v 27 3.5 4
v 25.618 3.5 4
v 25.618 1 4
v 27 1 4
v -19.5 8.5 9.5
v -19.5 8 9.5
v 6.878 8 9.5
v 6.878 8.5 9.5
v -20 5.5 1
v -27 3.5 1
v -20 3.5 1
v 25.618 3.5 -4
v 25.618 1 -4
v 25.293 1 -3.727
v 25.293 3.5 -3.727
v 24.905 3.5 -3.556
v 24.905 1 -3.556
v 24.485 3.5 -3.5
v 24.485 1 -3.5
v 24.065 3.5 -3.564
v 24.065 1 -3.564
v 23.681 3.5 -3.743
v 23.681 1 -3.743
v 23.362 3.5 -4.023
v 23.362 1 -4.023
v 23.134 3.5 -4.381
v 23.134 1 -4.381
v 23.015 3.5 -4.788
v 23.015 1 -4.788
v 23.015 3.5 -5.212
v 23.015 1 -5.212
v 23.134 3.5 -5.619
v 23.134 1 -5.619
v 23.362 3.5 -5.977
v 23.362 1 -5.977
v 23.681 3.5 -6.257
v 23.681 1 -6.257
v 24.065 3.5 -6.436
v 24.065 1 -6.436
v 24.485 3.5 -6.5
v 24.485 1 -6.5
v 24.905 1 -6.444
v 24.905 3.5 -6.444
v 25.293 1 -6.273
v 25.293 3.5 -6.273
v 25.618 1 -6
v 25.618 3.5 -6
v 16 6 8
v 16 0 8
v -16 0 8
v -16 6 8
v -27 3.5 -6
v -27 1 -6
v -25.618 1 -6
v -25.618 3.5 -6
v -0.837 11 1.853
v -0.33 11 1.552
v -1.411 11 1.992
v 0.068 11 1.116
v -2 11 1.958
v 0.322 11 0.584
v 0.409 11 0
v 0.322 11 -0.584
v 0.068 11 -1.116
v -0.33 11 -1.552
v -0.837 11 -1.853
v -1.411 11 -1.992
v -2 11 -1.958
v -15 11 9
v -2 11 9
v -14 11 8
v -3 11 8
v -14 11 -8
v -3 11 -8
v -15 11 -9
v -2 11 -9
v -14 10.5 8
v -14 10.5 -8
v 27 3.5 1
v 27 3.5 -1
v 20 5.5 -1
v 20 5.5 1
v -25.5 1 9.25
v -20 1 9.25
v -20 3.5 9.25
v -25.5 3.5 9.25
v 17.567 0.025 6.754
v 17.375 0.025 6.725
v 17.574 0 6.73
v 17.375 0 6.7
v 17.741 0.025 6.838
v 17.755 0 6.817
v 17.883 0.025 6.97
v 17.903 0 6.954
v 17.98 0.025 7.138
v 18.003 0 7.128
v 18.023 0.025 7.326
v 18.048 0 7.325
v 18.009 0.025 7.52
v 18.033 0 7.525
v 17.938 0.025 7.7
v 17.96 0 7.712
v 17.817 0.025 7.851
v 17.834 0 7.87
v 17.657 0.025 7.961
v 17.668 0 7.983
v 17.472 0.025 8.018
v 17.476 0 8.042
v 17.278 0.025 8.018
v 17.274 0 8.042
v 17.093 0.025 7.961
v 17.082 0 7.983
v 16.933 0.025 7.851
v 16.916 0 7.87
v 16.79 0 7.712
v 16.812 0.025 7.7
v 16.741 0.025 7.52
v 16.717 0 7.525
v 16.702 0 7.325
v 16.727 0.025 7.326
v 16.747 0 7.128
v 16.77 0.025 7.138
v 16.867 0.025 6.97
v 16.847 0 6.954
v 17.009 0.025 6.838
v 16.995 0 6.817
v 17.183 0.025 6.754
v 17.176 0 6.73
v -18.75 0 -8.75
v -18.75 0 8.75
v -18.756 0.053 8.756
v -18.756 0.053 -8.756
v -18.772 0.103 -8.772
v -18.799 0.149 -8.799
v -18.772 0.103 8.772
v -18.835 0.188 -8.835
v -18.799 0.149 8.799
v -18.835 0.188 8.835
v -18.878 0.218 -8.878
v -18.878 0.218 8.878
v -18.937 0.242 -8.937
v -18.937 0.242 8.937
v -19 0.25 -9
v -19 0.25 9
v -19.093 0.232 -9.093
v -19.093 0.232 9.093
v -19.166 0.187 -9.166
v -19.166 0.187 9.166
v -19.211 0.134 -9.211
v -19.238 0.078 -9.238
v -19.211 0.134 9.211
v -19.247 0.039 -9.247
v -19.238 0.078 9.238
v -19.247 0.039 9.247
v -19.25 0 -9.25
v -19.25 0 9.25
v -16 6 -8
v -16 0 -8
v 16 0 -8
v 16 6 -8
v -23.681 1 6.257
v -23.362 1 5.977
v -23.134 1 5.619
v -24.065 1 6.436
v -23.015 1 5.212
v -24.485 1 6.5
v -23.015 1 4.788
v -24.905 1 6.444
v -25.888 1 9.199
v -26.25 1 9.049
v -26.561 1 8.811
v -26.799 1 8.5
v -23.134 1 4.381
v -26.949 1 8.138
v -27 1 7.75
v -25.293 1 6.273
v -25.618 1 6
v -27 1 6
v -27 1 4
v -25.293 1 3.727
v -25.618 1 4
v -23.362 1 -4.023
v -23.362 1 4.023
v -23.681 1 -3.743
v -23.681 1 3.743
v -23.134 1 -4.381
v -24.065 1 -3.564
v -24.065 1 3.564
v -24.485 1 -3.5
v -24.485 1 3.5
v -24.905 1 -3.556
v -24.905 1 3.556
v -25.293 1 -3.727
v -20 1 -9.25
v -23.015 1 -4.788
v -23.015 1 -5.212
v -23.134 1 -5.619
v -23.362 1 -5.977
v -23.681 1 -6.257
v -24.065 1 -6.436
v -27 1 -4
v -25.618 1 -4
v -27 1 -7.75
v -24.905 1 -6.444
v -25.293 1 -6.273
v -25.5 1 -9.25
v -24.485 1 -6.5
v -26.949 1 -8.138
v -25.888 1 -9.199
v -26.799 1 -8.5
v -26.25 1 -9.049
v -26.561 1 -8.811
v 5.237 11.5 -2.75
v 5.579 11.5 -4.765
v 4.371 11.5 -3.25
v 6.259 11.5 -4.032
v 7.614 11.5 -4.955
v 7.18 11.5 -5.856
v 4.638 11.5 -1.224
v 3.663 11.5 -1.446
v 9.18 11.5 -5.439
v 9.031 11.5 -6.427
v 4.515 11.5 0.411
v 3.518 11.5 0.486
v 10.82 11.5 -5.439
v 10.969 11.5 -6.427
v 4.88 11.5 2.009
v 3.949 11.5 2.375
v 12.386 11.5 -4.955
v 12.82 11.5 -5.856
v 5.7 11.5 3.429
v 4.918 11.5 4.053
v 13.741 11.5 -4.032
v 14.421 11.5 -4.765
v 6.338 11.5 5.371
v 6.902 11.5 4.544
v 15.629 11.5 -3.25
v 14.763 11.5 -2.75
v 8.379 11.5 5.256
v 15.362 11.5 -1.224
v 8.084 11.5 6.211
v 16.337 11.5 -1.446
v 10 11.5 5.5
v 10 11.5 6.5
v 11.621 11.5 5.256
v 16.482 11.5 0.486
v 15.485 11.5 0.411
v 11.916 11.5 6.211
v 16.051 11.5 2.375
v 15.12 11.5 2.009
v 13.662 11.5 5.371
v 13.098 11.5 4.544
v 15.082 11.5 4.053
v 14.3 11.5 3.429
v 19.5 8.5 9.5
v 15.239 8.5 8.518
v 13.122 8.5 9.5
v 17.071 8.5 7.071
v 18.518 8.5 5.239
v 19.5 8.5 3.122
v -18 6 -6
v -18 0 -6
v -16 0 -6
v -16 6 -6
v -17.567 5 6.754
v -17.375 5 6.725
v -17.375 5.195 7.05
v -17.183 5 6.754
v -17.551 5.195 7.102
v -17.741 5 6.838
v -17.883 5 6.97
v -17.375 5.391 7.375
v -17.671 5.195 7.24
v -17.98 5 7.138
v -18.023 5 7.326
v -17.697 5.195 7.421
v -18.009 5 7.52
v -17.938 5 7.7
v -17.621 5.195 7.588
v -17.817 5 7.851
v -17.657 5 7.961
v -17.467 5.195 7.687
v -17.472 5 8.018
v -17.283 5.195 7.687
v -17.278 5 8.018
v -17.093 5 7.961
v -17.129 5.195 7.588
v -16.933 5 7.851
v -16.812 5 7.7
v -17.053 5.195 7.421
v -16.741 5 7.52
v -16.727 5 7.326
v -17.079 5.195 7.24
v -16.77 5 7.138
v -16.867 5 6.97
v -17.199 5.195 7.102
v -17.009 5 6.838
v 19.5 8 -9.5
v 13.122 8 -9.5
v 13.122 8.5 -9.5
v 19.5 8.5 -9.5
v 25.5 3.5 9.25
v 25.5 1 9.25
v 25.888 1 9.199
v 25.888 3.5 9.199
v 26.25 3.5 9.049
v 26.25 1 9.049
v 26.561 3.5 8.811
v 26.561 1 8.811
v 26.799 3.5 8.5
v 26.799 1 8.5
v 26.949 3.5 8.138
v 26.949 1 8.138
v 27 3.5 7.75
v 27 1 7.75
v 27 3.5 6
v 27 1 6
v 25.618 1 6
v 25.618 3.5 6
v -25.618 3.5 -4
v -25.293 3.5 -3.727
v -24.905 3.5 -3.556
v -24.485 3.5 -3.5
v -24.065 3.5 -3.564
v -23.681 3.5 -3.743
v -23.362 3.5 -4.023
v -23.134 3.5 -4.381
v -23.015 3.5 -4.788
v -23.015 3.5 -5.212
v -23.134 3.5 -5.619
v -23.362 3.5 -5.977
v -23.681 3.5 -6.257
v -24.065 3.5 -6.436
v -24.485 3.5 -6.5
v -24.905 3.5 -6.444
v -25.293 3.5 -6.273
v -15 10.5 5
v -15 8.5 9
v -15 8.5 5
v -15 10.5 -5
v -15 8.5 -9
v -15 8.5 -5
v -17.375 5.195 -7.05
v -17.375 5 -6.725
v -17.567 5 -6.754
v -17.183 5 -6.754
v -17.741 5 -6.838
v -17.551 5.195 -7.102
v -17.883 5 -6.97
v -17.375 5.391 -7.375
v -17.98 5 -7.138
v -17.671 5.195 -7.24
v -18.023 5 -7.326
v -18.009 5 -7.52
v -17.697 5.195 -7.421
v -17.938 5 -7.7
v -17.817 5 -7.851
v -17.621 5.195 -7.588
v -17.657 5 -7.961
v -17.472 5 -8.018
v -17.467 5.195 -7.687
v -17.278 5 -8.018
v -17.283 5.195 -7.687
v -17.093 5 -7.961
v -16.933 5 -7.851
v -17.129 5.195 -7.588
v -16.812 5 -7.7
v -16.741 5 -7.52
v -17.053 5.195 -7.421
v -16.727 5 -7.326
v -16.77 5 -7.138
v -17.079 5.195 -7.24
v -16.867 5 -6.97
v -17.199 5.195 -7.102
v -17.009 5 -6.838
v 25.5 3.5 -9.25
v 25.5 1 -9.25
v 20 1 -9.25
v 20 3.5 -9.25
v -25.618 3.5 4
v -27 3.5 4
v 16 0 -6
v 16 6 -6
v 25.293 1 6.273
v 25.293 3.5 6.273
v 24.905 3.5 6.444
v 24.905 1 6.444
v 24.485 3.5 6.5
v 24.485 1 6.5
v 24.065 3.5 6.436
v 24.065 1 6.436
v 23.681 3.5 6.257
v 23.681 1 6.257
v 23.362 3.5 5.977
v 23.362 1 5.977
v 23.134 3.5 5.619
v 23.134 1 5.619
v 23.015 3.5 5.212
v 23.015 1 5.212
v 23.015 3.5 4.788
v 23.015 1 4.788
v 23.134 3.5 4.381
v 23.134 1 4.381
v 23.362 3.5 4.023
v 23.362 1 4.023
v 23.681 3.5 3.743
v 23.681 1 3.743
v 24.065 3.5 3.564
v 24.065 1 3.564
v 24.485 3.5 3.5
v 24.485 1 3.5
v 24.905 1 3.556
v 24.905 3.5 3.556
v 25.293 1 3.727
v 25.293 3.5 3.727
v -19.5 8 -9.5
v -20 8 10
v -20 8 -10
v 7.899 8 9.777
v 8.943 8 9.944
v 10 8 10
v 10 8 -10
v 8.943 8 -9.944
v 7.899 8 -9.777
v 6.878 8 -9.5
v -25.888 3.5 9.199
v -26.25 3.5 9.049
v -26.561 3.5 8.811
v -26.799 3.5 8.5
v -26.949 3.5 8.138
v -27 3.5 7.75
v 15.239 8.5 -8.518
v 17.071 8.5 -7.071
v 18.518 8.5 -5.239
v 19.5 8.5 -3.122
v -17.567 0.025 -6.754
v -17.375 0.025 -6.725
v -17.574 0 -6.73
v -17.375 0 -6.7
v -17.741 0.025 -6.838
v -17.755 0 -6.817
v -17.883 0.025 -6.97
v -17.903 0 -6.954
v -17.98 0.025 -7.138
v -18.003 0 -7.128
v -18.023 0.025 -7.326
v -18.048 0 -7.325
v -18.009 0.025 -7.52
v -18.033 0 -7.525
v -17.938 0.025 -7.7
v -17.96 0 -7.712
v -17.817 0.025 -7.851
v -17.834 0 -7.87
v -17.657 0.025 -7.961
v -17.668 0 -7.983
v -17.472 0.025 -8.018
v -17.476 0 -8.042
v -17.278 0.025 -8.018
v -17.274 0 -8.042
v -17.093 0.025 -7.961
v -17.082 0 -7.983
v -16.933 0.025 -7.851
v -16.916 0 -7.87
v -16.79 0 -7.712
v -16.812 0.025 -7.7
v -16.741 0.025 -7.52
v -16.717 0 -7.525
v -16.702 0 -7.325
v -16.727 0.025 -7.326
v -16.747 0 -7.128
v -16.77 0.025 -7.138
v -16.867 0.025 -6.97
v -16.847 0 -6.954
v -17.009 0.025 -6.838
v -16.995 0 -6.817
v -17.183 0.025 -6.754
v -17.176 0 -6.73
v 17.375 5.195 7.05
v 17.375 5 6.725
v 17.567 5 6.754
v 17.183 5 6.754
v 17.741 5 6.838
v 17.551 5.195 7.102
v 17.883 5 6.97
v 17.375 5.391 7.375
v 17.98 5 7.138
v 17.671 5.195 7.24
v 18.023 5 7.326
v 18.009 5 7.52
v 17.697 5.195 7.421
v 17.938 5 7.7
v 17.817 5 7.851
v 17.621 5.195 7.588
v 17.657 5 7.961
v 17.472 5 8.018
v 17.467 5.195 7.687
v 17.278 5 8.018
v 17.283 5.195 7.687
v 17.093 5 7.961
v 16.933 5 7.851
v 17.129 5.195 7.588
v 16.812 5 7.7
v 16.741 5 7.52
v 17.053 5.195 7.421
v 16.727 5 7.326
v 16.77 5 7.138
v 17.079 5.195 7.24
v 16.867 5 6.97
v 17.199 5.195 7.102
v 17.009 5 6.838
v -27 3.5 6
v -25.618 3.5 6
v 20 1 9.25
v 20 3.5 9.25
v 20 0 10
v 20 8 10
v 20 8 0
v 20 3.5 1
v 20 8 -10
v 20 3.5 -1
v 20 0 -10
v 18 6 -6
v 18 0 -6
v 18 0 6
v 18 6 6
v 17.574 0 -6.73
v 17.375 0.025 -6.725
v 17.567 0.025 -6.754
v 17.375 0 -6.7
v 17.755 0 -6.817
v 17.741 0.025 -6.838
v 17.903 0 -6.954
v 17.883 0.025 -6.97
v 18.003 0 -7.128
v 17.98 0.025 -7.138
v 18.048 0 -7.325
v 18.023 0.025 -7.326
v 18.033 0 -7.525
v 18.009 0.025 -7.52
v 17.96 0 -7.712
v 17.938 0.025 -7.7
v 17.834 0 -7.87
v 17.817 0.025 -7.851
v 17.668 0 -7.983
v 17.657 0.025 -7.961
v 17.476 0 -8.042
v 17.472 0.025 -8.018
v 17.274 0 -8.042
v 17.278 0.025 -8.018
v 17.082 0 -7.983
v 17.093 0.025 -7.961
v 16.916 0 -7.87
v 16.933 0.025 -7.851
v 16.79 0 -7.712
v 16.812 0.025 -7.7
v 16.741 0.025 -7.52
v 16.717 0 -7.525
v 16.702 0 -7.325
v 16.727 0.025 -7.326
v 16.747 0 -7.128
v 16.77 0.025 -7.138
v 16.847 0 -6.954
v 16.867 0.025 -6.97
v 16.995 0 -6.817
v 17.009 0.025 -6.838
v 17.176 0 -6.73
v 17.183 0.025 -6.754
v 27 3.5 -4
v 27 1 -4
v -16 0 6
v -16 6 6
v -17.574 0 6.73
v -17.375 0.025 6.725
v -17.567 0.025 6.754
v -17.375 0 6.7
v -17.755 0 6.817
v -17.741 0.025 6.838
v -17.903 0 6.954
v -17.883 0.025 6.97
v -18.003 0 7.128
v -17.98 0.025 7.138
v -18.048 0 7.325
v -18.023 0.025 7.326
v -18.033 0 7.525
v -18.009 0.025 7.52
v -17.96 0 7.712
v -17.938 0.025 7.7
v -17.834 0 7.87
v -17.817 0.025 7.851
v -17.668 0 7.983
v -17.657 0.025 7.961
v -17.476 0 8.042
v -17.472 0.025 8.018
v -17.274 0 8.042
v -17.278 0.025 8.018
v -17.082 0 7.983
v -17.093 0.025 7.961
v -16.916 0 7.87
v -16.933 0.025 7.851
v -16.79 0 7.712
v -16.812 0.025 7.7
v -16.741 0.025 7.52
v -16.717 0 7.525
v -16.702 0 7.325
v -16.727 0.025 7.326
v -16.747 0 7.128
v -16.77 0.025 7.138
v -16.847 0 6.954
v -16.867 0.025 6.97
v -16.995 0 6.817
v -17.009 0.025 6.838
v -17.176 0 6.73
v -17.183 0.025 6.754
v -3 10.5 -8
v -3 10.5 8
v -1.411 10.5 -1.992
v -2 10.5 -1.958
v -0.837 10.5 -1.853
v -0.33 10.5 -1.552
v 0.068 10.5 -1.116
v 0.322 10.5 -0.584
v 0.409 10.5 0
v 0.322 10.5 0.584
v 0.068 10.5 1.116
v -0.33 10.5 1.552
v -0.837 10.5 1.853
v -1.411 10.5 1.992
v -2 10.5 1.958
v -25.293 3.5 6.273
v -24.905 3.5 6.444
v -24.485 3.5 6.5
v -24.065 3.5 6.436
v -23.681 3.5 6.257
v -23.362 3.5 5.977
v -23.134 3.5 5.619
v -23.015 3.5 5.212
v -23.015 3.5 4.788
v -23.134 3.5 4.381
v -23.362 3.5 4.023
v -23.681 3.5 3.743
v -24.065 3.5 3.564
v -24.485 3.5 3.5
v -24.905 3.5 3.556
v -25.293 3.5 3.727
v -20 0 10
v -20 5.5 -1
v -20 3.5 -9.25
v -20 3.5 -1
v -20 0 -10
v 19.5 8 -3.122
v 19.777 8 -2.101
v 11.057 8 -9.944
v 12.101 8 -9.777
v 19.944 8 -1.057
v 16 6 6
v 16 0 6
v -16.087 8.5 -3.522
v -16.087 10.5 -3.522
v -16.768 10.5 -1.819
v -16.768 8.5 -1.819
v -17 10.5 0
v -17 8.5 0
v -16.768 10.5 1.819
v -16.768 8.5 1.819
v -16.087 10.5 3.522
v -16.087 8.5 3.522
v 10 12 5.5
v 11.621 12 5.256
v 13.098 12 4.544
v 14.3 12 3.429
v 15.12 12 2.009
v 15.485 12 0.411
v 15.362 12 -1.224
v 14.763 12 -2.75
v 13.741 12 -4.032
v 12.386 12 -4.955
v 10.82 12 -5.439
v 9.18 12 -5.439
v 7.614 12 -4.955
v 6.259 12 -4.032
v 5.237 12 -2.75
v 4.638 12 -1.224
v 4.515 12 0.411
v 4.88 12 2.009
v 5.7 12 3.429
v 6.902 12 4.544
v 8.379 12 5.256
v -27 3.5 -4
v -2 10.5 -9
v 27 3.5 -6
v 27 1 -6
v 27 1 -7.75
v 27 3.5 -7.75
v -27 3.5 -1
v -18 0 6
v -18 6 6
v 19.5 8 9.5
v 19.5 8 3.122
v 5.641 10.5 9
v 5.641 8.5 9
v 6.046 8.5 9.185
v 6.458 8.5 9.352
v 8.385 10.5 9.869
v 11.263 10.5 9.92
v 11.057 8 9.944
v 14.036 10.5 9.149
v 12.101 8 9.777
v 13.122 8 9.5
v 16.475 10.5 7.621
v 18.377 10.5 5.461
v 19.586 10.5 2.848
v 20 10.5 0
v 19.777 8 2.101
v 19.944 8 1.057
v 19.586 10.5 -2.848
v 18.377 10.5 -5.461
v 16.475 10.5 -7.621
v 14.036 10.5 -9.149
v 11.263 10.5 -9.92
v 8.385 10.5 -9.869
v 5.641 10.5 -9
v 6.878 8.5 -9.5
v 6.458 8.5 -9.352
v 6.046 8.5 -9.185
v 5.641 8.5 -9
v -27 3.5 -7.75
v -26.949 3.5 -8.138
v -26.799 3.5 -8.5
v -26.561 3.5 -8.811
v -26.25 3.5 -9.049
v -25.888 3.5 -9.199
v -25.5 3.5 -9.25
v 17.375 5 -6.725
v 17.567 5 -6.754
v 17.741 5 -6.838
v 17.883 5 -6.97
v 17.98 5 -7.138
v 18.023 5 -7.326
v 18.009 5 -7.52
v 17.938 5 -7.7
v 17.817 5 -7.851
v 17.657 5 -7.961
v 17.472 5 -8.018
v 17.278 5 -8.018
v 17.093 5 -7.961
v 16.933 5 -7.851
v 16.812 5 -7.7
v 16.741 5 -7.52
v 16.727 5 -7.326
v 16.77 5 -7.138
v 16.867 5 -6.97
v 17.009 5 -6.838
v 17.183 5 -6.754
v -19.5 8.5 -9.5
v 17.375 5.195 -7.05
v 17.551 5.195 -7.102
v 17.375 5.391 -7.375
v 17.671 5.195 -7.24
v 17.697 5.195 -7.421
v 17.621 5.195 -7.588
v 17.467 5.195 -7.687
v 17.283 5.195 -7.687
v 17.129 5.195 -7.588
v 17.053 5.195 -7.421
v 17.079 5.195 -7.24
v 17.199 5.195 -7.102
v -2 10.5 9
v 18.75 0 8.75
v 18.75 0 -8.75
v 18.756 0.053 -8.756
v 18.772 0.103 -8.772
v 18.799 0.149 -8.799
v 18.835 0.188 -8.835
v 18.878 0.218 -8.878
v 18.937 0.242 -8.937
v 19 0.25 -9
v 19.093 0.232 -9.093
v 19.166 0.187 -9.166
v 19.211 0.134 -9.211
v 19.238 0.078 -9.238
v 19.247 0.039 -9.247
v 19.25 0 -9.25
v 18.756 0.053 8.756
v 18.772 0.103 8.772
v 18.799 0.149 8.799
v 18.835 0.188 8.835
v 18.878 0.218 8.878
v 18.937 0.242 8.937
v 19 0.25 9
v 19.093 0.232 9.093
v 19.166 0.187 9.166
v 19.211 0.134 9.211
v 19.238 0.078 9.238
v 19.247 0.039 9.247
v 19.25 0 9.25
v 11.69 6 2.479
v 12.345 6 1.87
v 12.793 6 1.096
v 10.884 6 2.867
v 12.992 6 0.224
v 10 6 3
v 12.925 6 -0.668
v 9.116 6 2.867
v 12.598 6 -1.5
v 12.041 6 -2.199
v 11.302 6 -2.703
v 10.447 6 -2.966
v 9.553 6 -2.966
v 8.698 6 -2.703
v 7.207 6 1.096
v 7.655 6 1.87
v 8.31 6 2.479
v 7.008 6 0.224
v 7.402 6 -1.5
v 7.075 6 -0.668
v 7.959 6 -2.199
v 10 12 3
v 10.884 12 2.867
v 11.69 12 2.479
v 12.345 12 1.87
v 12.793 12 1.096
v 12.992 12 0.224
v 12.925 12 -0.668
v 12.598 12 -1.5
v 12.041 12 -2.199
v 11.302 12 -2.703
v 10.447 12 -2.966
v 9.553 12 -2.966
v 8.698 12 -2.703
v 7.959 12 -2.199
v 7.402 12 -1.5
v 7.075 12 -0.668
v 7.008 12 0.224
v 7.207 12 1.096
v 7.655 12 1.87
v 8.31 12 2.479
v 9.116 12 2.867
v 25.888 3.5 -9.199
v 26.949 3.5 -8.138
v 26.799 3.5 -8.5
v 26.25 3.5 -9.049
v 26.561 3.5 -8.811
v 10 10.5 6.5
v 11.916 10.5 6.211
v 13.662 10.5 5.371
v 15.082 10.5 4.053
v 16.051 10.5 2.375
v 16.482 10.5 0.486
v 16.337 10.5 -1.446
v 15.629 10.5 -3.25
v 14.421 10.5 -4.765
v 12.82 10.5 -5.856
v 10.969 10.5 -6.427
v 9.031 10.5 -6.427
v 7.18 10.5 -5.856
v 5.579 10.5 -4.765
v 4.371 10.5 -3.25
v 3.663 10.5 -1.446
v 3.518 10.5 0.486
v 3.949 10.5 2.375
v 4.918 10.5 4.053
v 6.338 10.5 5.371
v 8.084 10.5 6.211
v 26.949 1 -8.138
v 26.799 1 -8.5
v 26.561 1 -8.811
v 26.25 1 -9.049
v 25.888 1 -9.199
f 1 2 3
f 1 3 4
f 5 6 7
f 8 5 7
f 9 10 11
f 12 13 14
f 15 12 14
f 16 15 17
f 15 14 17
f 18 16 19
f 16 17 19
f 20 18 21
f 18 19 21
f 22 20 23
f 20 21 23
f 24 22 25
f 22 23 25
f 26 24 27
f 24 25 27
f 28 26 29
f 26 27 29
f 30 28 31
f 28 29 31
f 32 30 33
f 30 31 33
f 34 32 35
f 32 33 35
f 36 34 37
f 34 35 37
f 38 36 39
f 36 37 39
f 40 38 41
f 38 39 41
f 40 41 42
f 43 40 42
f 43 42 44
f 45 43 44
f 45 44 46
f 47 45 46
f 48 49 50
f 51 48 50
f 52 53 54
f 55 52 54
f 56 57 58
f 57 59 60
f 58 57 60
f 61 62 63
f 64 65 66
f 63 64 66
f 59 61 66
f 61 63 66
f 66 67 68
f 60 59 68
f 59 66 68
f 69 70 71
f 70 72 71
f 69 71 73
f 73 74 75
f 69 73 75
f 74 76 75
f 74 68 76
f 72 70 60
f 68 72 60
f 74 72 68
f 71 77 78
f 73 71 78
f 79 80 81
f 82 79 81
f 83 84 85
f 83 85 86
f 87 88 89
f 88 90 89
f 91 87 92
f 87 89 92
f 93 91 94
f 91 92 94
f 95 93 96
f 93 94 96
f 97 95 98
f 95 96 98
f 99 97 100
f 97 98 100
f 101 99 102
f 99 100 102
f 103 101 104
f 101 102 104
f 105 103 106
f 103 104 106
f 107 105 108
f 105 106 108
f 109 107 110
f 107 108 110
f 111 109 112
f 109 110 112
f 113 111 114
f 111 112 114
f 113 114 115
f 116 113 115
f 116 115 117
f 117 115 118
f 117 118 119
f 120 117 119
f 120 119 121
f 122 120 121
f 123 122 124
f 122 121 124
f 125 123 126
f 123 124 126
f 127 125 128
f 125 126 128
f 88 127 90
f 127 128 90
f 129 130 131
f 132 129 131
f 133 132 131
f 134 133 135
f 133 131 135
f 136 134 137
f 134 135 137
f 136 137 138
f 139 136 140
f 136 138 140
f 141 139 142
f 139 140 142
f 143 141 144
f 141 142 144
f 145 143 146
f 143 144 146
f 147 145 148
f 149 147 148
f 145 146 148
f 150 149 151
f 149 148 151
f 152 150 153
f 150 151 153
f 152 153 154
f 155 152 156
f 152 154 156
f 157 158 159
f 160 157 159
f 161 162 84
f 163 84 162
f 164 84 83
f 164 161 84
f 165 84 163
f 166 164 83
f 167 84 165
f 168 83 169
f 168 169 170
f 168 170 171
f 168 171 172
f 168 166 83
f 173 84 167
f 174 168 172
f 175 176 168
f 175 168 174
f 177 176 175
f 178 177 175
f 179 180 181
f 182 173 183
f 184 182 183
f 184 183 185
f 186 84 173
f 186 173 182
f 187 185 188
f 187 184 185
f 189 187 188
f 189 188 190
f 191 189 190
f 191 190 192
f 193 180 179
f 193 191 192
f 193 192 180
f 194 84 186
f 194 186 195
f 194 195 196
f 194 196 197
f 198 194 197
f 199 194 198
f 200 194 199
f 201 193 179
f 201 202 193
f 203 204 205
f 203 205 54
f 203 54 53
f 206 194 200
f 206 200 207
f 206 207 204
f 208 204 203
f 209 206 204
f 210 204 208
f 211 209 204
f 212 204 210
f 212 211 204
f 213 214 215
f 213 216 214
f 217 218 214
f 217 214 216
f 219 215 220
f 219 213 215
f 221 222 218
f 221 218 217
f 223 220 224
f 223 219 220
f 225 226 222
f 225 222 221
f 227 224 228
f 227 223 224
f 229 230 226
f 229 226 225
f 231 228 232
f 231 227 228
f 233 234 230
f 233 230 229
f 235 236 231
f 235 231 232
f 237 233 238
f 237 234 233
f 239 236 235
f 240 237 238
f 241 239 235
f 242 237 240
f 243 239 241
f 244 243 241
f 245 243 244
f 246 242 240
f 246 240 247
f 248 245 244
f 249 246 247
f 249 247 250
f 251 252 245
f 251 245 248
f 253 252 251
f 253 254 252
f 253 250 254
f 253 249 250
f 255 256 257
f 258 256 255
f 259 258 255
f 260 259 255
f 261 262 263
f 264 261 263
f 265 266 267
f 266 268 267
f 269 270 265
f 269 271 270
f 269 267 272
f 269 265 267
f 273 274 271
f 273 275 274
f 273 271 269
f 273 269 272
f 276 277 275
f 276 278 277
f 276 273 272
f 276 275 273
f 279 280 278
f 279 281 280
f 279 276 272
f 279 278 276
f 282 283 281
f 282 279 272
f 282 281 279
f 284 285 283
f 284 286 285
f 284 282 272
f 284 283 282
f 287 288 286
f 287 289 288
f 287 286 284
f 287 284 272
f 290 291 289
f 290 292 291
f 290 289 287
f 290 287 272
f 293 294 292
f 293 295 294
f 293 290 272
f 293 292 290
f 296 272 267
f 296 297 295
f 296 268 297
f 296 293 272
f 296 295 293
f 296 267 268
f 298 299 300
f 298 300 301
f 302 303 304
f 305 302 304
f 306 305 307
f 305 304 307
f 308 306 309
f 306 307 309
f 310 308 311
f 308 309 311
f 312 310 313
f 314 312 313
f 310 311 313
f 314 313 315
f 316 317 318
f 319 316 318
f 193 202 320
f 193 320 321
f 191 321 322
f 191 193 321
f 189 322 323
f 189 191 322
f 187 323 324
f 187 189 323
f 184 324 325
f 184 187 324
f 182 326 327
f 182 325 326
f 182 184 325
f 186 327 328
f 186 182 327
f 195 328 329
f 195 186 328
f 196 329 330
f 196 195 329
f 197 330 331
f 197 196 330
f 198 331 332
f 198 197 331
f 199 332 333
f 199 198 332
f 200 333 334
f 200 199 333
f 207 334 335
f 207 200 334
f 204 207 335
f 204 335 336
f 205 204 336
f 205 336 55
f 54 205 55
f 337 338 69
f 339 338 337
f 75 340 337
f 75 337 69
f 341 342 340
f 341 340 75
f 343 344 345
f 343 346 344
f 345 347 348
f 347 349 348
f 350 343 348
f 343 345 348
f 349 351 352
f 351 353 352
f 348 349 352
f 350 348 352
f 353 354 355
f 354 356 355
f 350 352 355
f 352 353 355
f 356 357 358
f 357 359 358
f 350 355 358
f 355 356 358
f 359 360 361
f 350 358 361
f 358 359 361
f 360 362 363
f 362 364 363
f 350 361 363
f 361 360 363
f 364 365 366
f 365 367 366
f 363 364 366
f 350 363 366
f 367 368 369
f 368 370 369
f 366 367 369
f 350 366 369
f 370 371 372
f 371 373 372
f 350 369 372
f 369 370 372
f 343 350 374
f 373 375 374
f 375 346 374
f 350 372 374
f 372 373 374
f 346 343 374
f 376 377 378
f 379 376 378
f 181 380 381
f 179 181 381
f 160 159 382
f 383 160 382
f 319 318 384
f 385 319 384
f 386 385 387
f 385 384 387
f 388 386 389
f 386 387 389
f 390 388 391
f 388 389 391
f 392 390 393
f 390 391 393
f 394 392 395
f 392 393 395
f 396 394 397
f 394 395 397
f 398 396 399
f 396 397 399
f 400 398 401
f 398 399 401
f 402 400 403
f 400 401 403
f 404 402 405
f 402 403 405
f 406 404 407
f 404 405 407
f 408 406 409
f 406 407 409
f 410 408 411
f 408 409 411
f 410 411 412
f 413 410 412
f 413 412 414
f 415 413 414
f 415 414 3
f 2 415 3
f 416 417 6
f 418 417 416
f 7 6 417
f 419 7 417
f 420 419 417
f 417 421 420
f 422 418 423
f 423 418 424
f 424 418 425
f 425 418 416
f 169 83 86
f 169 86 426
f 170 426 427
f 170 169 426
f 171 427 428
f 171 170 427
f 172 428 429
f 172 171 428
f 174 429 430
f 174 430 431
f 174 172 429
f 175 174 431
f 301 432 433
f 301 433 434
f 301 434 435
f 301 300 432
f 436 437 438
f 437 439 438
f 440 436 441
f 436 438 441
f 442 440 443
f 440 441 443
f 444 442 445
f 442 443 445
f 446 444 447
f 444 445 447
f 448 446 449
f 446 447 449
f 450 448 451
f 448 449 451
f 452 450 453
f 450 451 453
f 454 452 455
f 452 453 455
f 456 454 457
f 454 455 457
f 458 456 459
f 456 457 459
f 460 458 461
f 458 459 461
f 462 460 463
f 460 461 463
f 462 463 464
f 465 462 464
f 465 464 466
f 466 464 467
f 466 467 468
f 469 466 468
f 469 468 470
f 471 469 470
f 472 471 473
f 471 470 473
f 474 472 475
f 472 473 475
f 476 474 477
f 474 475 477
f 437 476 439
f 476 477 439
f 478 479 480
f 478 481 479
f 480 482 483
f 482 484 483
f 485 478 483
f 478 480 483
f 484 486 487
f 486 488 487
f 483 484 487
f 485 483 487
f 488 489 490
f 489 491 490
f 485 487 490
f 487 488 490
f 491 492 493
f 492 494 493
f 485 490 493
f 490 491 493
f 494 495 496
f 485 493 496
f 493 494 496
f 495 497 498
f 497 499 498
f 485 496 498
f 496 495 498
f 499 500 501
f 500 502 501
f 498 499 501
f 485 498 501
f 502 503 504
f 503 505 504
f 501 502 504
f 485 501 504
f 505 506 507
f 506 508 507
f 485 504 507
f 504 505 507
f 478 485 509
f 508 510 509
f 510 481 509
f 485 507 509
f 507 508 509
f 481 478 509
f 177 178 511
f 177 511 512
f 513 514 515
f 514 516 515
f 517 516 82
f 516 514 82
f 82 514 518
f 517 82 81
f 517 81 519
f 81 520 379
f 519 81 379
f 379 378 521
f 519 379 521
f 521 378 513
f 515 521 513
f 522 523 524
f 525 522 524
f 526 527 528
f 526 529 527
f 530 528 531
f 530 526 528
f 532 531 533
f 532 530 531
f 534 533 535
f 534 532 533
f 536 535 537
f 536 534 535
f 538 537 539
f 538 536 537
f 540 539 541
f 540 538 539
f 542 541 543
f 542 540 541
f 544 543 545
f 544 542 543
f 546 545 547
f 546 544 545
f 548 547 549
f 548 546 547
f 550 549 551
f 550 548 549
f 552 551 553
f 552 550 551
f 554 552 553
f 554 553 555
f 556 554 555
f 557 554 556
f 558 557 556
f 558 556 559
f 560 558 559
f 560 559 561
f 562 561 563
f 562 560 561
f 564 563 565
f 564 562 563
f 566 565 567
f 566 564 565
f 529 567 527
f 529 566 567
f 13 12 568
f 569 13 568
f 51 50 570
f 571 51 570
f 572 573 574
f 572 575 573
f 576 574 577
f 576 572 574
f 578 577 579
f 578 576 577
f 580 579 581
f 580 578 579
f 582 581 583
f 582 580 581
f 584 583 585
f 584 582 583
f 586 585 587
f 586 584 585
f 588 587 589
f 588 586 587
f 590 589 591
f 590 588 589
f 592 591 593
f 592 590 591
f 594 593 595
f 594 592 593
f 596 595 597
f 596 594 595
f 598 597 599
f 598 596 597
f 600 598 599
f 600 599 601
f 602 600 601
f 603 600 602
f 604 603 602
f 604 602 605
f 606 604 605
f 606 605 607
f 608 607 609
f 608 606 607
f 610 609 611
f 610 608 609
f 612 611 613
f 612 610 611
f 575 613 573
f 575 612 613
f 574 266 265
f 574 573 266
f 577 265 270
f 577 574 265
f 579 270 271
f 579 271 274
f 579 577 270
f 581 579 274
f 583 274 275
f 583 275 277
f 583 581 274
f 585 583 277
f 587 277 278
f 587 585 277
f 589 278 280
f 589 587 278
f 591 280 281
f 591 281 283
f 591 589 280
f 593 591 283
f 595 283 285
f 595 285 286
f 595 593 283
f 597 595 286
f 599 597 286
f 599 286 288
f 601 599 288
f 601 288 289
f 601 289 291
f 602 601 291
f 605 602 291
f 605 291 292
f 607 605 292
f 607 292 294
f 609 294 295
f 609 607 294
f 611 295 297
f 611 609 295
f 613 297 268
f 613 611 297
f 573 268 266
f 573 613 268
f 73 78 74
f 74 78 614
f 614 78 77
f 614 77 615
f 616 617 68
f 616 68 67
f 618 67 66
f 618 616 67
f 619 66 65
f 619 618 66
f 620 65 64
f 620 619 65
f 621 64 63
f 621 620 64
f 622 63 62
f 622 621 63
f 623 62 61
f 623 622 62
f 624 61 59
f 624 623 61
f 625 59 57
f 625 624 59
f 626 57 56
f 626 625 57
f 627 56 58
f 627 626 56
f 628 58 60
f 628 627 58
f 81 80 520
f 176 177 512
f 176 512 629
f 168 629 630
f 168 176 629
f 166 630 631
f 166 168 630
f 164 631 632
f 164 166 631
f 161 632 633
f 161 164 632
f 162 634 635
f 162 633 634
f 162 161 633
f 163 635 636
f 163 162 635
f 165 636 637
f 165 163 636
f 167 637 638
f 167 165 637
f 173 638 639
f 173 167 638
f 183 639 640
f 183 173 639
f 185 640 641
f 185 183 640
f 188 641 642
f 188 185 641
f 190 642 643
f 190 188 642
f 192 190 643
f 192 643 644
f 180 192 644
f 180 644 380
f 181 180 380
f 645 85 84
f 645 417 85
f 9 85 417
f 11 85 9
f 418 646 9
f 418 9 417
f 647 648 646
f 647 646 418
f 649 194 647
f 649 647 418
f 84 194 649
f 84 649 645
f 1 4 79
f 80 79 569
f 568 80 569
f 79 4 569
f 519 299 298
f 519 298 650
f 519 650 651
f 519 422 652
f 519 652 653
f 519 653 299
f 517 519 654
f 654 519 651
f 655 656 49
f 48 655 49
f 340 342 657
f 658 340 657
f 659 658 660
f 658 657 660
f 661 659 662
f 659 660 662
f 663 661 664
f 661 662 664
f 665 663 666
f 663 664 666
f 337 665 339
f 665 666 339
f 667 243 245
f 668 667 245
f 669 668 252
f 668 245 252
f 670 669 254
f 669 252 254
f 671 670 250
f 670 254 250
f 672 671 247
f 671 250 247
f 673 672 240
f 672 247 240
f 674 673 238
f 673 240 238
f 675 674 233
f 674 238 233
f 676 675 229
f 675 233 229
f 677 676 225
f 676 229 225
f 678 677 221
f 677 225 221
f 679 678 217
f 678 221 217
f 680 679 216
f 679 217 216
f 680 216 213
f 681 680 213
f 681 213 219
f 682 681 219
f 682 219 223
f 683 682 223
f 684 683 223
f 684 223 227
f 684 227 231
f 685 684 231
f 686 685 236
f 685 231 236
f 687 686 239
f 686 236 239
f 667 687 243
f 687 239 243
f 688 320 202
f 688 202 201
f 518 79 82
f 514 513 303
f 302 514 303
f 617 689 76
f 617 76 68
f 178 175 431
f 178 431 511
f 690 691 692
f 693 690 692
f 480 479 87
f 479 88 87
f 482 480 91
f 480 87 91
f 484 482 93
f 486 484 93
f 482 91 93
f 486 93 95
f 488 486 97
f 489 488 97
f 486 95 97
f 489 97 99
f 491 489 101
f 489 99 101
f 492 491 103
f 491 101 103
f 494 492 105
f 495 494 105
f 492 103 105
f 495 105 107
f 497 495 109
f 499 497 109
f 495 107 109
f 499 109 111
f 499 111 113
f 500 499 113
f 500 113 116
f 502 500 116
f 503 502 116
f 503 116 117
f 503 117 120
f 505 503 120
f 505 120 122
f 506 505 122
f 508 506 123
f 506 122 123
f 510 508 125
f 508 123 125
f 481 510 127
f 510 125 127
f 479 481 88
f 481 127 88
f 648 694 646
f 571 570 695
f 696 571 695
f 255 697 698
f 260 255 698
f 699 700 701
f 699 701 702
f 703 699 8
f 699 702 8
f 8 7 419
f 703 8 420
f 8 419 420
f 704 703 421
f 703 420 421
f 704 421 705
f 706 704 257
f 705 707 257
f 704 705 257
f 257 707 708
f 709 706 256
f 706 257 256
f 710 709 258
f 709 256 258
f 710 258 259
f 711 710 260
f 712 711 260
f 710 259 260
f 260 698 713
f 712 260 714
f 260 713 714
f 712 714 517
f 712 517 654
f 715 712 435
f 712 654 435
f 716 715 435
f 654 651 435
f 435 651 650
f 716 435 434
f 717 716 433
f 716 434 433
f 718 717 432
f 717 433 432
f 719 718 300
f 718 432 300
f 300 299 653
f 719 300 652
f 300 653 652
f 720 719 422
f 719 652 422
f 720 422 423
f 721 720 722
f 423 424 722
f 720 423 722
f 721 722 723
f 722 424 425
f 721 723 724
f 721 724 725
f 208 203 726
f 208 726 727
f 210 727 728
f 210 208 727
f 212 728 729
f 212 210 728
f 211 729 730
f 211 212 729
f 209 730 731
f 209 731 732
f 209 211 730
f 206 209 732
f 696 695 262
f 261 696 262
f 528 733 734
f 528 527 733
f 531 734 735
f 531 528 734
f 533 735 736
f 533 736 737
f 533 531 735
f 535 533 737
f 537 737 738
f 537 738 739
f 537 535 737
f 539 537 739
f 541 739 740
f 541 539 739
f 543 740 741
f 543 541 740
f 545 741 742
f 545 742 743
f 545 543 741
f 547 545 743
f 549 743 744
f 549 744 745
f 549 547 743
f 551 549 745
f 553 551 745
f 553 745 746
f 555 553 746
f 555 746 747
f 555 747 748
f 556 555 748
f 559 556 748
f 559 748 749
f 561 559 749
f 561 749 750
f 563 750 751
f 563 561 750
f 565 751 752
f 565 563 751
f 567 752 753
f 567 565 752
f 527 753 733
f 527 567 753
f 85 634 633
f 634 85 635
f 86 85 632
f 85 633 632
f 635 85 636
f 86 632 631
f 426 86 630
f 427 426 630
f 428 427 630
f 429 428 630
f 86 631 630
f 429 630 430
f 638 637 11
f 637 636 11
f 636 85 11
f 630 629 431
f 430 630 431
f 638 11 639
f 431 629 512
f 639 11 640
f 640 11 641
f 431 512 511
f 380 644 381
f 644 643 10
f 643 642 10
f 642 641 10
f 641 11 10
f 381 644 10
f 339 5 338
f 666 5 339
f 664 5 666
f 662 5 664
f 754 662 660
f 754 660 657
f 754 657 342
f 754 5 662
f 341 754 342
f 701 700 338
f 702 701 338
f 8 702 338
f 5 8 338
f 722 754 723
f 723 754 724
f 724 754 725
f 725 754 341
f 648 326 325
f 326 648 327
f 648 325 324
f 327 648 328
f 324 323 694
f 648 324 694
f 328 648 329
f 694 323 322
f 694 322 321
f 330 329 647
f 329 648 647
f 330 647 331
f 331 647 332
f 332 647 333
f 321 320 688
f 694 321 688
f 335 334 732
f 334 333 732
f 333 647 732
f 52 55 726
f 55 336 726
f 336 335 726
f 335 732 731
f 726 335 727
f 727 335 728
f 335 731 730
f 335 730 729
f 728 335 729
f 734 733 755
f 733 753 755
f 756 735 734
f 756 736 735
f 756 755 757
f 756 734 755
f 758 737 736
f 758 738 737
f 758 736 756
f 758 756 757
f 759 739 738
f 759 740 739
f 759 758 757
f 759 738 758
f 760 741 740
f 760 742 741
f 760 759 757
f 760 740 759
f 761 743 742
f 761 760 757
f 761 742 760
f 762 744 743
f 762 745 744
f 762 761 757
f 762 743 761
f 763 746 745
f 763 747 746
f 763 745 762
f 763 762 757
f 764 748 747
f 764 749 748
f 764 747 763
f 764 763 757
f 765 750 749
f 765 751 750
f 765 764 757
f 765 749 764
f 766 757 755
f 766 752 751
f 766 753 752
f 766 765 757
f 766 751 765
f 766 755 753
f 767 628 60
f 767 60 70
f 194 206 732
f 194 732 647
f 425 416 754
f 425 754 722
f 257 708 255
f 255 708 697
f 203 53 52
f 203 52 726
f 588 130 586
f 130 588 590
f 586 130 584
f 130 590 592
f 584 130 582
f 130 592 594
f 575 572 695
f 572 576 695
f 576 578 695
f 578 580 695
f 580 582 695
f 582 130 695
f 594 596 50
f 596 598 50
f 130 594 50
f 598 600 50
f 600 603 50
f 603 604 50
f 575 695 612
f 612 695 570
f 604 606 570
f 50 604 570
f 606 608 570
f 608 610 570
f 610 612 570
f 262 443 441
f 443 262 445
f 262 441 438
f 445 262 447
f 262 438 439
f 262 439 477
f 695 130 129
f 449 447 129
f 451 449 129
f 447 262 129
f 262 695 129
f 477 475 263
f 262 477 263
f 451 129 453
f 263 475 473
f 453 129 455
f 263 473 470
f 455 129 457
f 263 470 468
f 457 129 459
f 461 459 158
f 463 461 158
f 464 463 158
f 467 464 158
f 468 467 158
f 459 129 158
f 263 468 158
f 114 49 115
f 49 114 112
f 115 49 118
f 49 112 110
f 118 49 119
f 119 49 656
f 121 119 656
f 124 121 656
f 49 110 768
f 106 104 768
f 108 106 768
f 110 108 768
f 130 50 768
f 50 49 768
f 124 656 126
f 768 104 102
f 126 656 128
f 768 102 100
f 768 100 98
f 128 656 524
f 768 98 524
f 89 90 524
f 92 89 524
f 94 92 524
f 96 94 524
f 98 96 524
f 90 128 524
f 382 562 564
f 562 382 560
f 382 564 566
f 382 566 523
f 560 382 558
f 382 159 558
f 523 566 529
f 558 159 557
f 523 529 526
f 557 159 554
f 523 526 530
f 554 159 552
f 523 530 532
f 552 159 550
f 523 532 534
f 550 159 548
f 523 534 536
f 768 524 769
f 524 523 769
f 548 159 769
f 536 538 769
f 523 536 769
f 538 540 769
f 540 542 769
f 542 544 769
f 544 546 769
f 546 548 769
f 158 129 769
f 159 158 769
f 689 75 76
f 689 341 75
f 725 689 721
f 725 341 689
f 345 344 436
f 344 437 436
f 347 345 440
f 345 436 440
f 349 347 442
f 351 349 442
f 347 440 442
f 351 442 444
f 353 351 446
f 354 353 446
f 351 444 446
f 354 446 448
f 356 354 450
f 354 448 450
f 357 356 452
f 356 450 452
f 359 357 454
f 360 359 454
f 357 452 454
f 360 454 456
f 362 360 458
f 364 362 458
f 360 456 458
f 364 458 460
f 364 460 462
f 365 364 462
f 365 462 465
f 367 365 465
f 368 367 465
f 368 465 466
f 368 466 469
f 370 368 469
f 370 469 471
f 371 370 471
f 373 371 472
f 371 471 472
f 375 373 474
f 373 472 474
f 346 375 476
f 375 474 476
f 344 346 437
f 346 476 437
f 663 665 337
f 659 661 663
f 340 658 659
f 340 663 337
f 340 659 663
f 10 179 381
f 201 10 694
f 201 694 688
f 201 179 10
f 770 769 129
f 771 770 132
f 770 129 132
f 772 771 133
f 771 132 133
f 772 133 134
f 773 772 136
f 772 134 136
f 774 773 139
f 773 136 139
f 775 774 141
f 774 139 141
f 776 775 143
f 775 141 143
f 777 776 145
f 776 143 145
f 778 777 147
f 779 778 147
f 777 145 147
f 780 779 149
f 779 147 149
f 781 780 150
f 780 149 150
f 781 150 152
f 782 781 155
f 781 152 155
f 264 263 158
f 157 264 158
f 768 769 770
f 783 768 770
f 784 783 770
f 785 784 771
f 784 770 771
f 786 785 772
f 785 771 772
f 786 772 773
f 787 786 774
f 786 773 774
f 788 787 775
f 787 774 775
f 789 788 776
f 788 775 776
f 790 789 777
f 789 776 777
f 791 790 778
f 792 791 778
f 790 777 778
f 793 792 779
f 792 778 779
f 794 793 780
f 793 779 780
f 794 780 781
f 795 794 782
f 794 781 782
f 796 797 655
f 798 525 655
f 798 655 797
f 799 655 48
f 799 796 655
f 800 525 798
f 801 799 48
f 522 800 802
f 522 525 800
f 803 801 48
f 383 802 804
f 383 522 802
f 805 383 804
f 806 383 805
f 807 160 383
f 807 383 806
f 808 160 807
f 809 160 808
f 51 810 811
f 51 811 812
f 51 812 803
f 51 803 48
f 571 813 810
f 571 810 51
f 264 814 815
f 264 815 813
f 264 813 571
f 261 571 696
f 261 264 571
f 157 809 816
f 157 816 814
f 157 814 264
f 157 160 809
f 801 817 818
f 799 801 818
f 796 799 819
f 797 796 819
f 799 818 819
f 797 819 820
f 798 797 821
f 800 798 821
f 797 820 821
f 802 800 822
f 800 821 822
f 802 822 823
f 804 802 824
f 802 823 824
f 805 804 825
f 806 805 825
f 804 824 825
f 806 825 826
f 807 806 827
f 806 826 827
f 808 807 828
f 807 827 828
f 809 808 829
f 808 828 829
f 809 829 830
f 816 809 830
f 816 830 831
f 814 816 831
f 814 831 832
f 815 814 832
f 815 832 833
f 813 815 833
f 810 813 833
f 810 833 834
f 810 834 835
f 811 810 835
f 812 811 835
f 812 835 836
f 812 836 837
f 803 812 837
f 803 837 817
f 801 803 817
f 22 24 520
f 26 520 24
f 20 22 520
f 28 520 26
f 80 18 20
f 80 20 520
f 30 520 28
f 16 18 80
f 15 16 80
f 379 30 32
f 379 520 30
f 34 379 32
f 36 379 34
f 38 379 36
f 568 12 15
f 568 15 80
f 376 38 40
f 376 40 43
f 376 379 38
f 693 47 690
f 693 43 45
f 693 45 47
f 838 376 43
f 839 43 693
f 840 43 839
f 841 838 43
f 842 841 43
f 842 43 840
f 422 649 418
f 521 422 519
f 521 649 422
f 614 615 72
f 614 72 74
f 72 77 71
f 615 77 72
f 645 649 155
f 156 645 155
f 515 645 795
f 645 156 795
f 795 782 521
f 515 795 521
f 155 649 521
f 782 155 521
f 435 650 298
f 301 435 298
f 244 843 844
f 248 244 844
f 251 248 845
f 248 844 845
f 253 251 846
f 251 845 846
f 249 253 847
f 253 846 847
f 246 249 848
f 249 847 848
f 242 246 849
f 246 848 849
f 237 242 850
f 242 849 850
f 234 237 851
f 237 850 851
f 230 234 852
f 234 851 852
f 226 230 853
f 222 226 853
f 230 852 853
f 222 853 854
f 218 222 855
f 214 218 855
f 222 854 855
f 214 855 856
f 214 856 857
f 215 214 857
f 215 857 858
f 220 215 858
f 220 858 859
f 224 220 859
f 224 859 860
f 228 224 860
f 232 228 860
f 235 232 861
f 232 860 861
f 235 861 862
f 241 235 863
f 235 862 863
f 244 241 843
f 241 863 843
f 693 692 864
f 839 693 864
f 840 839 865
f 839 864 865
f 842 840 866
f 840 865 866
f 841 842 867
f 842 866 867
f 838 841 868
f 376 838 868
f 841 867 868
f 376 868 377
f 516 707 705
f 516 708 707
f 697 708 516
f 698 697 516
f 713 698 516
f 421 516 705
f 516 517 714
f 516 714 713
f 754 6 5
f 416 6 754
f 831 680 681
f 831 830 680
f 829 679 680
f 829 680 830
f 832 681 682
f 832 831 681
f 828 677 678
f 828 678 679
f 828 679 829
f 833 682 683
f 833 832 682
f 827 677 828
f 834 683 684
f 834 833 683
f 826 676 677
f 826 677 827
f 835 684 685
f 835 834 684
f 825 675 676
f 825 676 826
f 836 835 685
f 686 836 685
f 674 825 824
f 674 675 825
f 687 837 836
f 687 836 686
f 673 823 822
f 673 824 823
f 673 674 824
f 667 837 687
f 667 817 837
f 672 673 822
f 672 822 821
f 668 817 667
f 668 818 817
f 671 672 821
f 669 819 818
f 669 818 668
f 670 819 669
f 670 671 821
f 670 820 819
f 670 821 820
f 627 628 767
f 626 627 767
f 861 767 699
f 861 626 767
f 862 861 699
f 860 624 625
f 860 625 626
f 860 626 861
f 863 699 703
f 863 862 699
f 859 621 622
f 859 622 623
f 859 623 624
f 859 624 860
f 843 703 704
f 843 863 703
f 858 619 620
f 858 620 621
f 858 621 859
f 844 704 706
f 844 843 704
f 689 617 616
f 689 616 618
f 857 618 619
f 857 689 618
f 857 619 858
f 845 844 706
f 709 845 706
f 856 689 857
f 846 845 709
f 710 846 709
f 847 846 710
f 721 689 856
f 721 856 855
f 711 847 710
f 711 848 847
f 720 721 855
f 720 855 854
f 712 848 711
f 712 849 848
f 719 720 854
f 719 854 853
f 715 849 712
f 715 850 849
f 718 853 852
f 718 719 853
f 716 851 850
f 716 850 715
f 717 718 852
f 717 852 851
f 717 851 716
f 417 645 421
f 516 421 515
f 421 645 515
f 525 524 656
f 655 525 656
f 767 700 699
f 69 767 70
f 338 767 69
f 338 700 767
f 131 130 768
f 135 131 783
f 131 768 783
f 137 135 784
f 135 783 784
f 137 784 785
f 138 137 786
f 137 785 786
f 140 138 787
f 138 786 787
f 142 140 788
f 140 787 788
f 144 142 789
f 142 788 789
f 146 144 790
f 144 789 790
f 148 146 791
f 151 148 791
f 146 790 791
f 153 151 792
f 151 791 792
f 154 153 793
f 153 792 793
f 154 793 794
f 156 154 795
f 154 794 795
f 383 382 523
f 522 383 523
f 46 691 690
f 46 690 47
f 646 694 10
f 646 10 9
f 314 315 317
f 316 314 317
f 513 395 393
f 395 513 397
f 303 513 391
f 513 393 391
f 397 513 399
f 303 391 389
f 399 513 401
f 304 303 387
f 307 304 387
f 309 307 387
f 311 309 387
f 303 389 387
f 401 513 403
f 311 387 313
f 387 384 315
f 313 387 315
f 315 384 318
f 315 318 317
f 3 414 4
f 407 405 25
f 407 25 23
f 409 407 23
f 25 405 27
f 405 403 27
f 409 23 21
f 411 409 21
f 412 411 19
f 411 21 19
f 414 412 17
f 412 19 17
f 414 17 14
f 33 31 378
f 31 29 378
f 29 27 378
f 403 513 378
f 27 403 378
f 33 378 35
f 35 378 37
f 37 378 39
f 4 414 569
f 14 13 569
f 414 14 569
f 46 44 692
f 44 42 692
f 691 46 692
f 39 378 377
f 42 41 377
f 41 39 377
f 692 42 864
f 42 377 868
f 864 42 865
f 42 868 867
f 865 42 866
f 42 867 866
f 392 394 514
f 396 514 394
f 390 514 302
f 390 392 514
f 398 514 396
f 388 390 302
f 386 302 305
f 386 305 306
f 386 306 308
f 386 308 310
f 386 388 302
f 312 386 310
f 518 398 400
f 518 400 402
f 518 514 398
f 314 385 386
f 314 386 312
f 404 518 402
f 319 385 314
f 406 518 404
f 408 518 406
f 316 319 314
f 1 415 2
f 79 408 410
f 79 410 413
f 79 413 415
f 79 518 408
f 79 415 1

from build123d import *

# Parameters (mm, degrees)
SCHIZZO1_W                   = 40
SCHIZZO1_H                   = 20
ESTRUSIONE_ESTRUSIONE2_DEPTH = 8
TAGLIO_ESTRUSIONE4_DEPTH     = 6
ESTRUSIONE_ESTRUSIONE4_DEPTH = 2.5
SCHIZZO7_W                   = 39
SCHIZZO7_H                   = 19
ESTRUSIONE_ESTRUSIONE3_DEPTH = 0.5
SCHIZZO8_W                   = 11
SCHIZZO8_H                   = 16
ESTRUSIONE_ESTRUSIONE5_DEPTH = 0.5
SCHIZZO9_R                   = 6.5
ESTRUSIONE_ESTRUSIONE6_DEPTH = 1
SCHIZZO10_R                  = 5.5
ESTRUSIONE_ESTRUSIONE7_DEPTH = 0.5
SCHIZZO11_R                  = 3
TAGLIO_ESTRUSIONE5_DEPTH     = 26.377155081
SCHIZZO12_R                  = 1.5
ESTRUSIONE_ESTRUSIONE8_DEPTH = 2.5
TAGLIO_ESTRUSIONE6_DEPTH     = 31.020826105
SPECCHIA4_COPY_1_DEPTH       = 31.020826105
NERVATURA1_REACH             = 33.193
SCHIZZO16_WALL_W             = 71.666005732
SCHIZZO16_WALL_H             = 2


with BuildPart() as part:
    # Schizzo1 → Estrusione-Estrusione2 (new body)
    with BuildSketch(Plane(origin=(0, 0, 0), x_dir=(1, 0, 0), z_dir=(0, 1, 0))):
        Rectangle(SCHIZZO1_W, SCHIZZO1_H)
    extrude(amount=ESTRUSIONE_ESTRUSIONE2_DEPTH)

    # Schizzo2 → Taglio-Estrusione4 (cut)
    with BuildSketch(Plane(origin=(0, 0, 0), x_dir=(1, 0, 0), z_dir=(0, 1, 0))):
        Polygon((16, -8), (-16, -8), (-16, -6), (-18, -6), (-18, 6), (-16, 6), (-16, 8), (16, 8), (16, 6), (18, 6), (18, -6), (16, -6), align=None)
    extrude(amount=TAGLIO_ESTRUSIONE4_DEPTH, mode=Mode.SUBTRACT)

    # Schizzo3 → Foro per Vite M1-1 (revolve, cut)
    with BuildSketch(Plane(origin=(-17.375, 0, 7.375), x_dir=(0, 0, -1), z_dir=(1, 0, 0))):
        Polygon((0, 0), (0, 5.390559402), (0.65, 5), (0.65, 0.025), (0.675, 0), align=None)
    foro_per_vite_m1_1 = revolve(axis=Axis((-17.375, -6.35, 7.375), (0, 1, 0)), mode=Mode.SUBTRACT)

    # Specchia1: Foro per Vite M1-1 across plane
    add(foro_per_vite_m1_1.mirror(Plane(origin=(0, 0, 0), x_dir=(0, 0, 1), z_dir=(1, 0, 0))), mode=Mode.SUBTRACT)

    # Specchia2 copy 1 sketch → Specchia2 copy 1 (revolve, cut)
    with BuildSketch(Plane(origin=(17.375, 0, -7.375), x_dir=(0, 0, 1), z_dir=(-1, 0, 0))):
        Polygon((0, 0), (0, 5.390559402), (0.65, 5), (0.65, 0.025), (0.675, 0), align=None)
    revolve(axis=Axis((17.375, -6.35, -7.375), (0, 1, 0)), mode=Mode.SUBTRACT)

    # Specchia2 copy 2 sketch → Specchia2 copy 2 (revolve, cut)
    with BuildSketch(Plane(origin=(-17.375, 0, -7.375), x_dir=(0, 0, 1), z_dir=(1, 0, 0))):
        Polygon((0, 0), (0, -5.390559402), (0.65, -5), (0.65, -0.025), (0.675, 0), align=None)
    revolve(axis=Axis((-17.375, -6.35, -7.375), (0, -1, 0)), mode=Mode.SUBTRACT)

    # Taglia-Sweep3: sweep along a path in Schizzo5
    with BuildLine(Plane.XZ) as taglia_sweep3_path:
        Line((19, -9), (-19, -9))
        Line((-19, -9), (-19, 9))
        Line((-19, 9), (19, 9))
        Line((19, 9), (19, -9))
    # Schizzo4 → Taglia-Sweep3 (sweep, cut)
    with BuildSketch(Plane.XY):
        with BuildLine():
            Line((-19.25, 0), (-18.75, 0))
            ThreePointArc((-18.75, 0), (-19, 0.25), (-19.25, 0))
        make_face()
    sweep(path=taglia_sweep3_path.line, transition=Transition.RIGHT, mode=Mode.SUBTRACT)

    # Schizzo6 → Estrusione-Estrusione4 (add)
    with BuildSketch(Plane(origin=(0, 8, 0), x_dir=(1, 0, 0), z_dir=(0, 1, 0))):
        with BuildLine():
            Line((5.641101056, 9), (-15, 9))
            Line((-15, 9), (-15, 5))
            ThreePointArc((-15, 5), (-17, 0), (-15, -5))
            Line((-15, -5), (-15, -9))
            Line((-15, -9), (5.641101056, -9))
            ThreePointArc((5.641101056, -9), (20, 0), (5.641101056, 9))
        make_face()
    extrude(amount=ESTRUSIONE_ESTRUSIONE4_DEPTH)

    # Schizzo7 → Estrusione-Estrusione3 (add)
    with BuildSketch(Plane(origin=(0, 8, 0), x_dir=(1, 0, 0), z_dir=(0, 1, 0))):
        Rectangle(SCHIZZO7_W, SCHIZZO7_H)
    extrude(amount=ESTRUSIONE_ESTRUSIONE3_DEPTH)

    # Schizzo8 → Estrusione-Estrusione5 (add)
    with BuildSketch(Plane(origin=(0, 10.5, 0), x_dir=(1, 0, 0), z_dir=(0, 1, 0))):
        with BuildLine():
            Line((-15, 9), (-2, 9))
            Line((-2, 9), (-2, 1.957707578))
            ThreePointArc((-2, 1.957707578), (0.409122281, 0), (-2, -1.957707578))
            Line((-2, -1.957707578), (-2, -9))
            Line((-2, -9), (-15, -9))
            Line((-15, -9), (-15, 9))
        make_face()
        with Locations((-8.5, 0)):
            Rectangle(SCHIZZO8_W, SCHIZZO8_H, mode=Mode.SUBTRACT)
    extrude(amount=ESTRUSIONE_ESTRUSIONE5_DEPTH)

    # Schizzo9 → Estrusione-Estrusione6 (add)
    with BuildSketch(Plane(origin=(0, 10.5, 0), x_dir=(1, 0, 0), z_dir=(0, 1, 0))):
        with Locations((10, 0)):
            Circle(SCHIZZO9_R)
    extrude(amount=ESTRUSIONE_ESTRUSIONE6_DEPTH)

    # Schizzo10 → Estrusione-Estrusione7 (add)
    with BuildSketch(Plane(origin=(0, 11.5, 0), x_dir=(1, 0, 0), z_dir=(0, 1, 0))):
        with Locations((10, 0)):
            Circle(SCHIZZO10_R)
    extrude(amount=ESTRUSIONE_ESTRUSIONE7_DEPTH)

    # Schizzo11 → Taglio-Estrusione5 (cut, through all)
    with BuildSketch(Plane(origin=(0, 12, 0), x_dir=(1, 0, 0), z_dir=(0, 1, 0))):
        with Locations((10, 0)):
            Circle(SCHIZZO11_R)
    extrude(amount=-TAGLIO_ESTRUSIONE5_DEPTH, mode=Mode.SUBTRACT)

    # Schizzo12 → Estrusione-Estrusione8 (add)
    with BuildSketch(Plane(origin=(0, 1, 0), x_dir=(-1, 0, 0), z_dir=(0, -1, 0))):
        with BuildLine():
            Line((-25.5, 9.25), (-20, 9.25))
            Line((-20, 9.25), (-20, -9.25))
            Line((-20, -9.25), (-25.5, -9.25))
            ThreePointArc((-25.5, -9.25), (-26.560660172, -8.810660172), (-27, -7.75))
            Line((-27, -7.75), (-27, 7.75))
            ThreePointArc((-27, 7.75), (-26.560660172, 8.810660172), (-25.5, 9.25))
        make_face()
        with Locations((-24.5, 5)):
            Circle(SCHIZZO12_R, mode=Mode.SUBTRACT)
        with Locations((-24.5, -5)):
            Circle(SCHIZZO12_R, mode=Mode.SUBTRACT)
    estrusione_estrusione8 = extrude(amount=-ESTRUSIONE_ESTRUSIONE8_DEPTH)

    # Schizzo13 → Taglio-Estrusione6 (cut, through all)
    with BuildSketch(Plane(origin=(0, 3.5, 0), x_dir=(1, 0, 0), z_dir=(0, 1, 0))):
        with BuildLine():
            Line((25.618033989, 4), (34.322091749, 4))
            Line((34.322091749, 4), (34.322091749, 6))
            Line((34.322091749, 6), (25.618033989, 6))
            ThreePointArc((25.618033989, 6), (26, 5), (25.618033989, 4))
        make_face()
    taglio_estrusione6 = extrude(amount=-TAGLIO_ESTRUSIONE6_DEPTH, mode=Mode.SUBTRACT)

    # Specchia3: Taglio-Estrusione6 across plane
    add(taglio_estrusione6.mirror(Plane.XY), mode=Mode.SUBTRACT)

    # Specchia4: Estrusione-Estrusione8, Taglio-Estrusione6 across plane
    add(estrusione_estrusione8.mirror(Plane(origin=(0, 0, 0), x_dir=(0, 0, 1), z_dir=(1, 0, 0))))
    add(taglio_estrusione6.mirror(Plane(origin=(0, 0, 0), x_dir=(0, 0, 1), z_dir=(1, 0, 0))), mode=Mode.SUBTRACT)

    # Specchia4 copy 1 sketch → Specchia4 copy 1 (cut, through all)
    with BuildSketch(Plane(origin=(0, 3.5, 0), x_dir=(-1, 0, 0), z_dir=(0, 1, 0))):
        with BuildLine():
            Line((25.618033989, 4), (34.322091749, 4))
            Line((34.322091749, 4), (34.322091749, 6))
            Line((34.322091749, 6), (25.618033989, 6))
            ThreePointArc((25.618033989, 6), (26, 5), (25.618033989, 4))
        make_face()
    extrude(amount=-SPECCHIA4_COPY_1_DEPTH, mode=Mode.SUBTRACT)

    # Schizzo16 wall → Nervatura1 (add, up to next)
    with BuildSketch(Plane(origin=(23.5, 4.5, 0), x_dir=(-0.961523947641, 0.274721127897, 0), z_dir=(-0.274721127897, -0.961523947641, 0)), mode=Mode.PRIVATE) as nervatura1_sk1:
        Rectangle(SCHIZZO16_WALL_W, SCHIZZO16_WALL_H)
    nervatura1_tool1 = extrude(nervatura1_sk1.sketch, amount=NERVATURA1_REACH, mode=Mode.PRIVATE) - part.part
    nervatura1 = nervatura1_tool1.solids().sort_by_distance((23.5, 4.5, 0))[0]
    add(nervatura1)

    # Specchia5: Nervatura1 across plane
    add(nervatura1.mirror(Plane(origin=(0, 0, 0), x_dir=(0, 0, 1), z_dir=(1, 0, 0))))


solid = part.part
